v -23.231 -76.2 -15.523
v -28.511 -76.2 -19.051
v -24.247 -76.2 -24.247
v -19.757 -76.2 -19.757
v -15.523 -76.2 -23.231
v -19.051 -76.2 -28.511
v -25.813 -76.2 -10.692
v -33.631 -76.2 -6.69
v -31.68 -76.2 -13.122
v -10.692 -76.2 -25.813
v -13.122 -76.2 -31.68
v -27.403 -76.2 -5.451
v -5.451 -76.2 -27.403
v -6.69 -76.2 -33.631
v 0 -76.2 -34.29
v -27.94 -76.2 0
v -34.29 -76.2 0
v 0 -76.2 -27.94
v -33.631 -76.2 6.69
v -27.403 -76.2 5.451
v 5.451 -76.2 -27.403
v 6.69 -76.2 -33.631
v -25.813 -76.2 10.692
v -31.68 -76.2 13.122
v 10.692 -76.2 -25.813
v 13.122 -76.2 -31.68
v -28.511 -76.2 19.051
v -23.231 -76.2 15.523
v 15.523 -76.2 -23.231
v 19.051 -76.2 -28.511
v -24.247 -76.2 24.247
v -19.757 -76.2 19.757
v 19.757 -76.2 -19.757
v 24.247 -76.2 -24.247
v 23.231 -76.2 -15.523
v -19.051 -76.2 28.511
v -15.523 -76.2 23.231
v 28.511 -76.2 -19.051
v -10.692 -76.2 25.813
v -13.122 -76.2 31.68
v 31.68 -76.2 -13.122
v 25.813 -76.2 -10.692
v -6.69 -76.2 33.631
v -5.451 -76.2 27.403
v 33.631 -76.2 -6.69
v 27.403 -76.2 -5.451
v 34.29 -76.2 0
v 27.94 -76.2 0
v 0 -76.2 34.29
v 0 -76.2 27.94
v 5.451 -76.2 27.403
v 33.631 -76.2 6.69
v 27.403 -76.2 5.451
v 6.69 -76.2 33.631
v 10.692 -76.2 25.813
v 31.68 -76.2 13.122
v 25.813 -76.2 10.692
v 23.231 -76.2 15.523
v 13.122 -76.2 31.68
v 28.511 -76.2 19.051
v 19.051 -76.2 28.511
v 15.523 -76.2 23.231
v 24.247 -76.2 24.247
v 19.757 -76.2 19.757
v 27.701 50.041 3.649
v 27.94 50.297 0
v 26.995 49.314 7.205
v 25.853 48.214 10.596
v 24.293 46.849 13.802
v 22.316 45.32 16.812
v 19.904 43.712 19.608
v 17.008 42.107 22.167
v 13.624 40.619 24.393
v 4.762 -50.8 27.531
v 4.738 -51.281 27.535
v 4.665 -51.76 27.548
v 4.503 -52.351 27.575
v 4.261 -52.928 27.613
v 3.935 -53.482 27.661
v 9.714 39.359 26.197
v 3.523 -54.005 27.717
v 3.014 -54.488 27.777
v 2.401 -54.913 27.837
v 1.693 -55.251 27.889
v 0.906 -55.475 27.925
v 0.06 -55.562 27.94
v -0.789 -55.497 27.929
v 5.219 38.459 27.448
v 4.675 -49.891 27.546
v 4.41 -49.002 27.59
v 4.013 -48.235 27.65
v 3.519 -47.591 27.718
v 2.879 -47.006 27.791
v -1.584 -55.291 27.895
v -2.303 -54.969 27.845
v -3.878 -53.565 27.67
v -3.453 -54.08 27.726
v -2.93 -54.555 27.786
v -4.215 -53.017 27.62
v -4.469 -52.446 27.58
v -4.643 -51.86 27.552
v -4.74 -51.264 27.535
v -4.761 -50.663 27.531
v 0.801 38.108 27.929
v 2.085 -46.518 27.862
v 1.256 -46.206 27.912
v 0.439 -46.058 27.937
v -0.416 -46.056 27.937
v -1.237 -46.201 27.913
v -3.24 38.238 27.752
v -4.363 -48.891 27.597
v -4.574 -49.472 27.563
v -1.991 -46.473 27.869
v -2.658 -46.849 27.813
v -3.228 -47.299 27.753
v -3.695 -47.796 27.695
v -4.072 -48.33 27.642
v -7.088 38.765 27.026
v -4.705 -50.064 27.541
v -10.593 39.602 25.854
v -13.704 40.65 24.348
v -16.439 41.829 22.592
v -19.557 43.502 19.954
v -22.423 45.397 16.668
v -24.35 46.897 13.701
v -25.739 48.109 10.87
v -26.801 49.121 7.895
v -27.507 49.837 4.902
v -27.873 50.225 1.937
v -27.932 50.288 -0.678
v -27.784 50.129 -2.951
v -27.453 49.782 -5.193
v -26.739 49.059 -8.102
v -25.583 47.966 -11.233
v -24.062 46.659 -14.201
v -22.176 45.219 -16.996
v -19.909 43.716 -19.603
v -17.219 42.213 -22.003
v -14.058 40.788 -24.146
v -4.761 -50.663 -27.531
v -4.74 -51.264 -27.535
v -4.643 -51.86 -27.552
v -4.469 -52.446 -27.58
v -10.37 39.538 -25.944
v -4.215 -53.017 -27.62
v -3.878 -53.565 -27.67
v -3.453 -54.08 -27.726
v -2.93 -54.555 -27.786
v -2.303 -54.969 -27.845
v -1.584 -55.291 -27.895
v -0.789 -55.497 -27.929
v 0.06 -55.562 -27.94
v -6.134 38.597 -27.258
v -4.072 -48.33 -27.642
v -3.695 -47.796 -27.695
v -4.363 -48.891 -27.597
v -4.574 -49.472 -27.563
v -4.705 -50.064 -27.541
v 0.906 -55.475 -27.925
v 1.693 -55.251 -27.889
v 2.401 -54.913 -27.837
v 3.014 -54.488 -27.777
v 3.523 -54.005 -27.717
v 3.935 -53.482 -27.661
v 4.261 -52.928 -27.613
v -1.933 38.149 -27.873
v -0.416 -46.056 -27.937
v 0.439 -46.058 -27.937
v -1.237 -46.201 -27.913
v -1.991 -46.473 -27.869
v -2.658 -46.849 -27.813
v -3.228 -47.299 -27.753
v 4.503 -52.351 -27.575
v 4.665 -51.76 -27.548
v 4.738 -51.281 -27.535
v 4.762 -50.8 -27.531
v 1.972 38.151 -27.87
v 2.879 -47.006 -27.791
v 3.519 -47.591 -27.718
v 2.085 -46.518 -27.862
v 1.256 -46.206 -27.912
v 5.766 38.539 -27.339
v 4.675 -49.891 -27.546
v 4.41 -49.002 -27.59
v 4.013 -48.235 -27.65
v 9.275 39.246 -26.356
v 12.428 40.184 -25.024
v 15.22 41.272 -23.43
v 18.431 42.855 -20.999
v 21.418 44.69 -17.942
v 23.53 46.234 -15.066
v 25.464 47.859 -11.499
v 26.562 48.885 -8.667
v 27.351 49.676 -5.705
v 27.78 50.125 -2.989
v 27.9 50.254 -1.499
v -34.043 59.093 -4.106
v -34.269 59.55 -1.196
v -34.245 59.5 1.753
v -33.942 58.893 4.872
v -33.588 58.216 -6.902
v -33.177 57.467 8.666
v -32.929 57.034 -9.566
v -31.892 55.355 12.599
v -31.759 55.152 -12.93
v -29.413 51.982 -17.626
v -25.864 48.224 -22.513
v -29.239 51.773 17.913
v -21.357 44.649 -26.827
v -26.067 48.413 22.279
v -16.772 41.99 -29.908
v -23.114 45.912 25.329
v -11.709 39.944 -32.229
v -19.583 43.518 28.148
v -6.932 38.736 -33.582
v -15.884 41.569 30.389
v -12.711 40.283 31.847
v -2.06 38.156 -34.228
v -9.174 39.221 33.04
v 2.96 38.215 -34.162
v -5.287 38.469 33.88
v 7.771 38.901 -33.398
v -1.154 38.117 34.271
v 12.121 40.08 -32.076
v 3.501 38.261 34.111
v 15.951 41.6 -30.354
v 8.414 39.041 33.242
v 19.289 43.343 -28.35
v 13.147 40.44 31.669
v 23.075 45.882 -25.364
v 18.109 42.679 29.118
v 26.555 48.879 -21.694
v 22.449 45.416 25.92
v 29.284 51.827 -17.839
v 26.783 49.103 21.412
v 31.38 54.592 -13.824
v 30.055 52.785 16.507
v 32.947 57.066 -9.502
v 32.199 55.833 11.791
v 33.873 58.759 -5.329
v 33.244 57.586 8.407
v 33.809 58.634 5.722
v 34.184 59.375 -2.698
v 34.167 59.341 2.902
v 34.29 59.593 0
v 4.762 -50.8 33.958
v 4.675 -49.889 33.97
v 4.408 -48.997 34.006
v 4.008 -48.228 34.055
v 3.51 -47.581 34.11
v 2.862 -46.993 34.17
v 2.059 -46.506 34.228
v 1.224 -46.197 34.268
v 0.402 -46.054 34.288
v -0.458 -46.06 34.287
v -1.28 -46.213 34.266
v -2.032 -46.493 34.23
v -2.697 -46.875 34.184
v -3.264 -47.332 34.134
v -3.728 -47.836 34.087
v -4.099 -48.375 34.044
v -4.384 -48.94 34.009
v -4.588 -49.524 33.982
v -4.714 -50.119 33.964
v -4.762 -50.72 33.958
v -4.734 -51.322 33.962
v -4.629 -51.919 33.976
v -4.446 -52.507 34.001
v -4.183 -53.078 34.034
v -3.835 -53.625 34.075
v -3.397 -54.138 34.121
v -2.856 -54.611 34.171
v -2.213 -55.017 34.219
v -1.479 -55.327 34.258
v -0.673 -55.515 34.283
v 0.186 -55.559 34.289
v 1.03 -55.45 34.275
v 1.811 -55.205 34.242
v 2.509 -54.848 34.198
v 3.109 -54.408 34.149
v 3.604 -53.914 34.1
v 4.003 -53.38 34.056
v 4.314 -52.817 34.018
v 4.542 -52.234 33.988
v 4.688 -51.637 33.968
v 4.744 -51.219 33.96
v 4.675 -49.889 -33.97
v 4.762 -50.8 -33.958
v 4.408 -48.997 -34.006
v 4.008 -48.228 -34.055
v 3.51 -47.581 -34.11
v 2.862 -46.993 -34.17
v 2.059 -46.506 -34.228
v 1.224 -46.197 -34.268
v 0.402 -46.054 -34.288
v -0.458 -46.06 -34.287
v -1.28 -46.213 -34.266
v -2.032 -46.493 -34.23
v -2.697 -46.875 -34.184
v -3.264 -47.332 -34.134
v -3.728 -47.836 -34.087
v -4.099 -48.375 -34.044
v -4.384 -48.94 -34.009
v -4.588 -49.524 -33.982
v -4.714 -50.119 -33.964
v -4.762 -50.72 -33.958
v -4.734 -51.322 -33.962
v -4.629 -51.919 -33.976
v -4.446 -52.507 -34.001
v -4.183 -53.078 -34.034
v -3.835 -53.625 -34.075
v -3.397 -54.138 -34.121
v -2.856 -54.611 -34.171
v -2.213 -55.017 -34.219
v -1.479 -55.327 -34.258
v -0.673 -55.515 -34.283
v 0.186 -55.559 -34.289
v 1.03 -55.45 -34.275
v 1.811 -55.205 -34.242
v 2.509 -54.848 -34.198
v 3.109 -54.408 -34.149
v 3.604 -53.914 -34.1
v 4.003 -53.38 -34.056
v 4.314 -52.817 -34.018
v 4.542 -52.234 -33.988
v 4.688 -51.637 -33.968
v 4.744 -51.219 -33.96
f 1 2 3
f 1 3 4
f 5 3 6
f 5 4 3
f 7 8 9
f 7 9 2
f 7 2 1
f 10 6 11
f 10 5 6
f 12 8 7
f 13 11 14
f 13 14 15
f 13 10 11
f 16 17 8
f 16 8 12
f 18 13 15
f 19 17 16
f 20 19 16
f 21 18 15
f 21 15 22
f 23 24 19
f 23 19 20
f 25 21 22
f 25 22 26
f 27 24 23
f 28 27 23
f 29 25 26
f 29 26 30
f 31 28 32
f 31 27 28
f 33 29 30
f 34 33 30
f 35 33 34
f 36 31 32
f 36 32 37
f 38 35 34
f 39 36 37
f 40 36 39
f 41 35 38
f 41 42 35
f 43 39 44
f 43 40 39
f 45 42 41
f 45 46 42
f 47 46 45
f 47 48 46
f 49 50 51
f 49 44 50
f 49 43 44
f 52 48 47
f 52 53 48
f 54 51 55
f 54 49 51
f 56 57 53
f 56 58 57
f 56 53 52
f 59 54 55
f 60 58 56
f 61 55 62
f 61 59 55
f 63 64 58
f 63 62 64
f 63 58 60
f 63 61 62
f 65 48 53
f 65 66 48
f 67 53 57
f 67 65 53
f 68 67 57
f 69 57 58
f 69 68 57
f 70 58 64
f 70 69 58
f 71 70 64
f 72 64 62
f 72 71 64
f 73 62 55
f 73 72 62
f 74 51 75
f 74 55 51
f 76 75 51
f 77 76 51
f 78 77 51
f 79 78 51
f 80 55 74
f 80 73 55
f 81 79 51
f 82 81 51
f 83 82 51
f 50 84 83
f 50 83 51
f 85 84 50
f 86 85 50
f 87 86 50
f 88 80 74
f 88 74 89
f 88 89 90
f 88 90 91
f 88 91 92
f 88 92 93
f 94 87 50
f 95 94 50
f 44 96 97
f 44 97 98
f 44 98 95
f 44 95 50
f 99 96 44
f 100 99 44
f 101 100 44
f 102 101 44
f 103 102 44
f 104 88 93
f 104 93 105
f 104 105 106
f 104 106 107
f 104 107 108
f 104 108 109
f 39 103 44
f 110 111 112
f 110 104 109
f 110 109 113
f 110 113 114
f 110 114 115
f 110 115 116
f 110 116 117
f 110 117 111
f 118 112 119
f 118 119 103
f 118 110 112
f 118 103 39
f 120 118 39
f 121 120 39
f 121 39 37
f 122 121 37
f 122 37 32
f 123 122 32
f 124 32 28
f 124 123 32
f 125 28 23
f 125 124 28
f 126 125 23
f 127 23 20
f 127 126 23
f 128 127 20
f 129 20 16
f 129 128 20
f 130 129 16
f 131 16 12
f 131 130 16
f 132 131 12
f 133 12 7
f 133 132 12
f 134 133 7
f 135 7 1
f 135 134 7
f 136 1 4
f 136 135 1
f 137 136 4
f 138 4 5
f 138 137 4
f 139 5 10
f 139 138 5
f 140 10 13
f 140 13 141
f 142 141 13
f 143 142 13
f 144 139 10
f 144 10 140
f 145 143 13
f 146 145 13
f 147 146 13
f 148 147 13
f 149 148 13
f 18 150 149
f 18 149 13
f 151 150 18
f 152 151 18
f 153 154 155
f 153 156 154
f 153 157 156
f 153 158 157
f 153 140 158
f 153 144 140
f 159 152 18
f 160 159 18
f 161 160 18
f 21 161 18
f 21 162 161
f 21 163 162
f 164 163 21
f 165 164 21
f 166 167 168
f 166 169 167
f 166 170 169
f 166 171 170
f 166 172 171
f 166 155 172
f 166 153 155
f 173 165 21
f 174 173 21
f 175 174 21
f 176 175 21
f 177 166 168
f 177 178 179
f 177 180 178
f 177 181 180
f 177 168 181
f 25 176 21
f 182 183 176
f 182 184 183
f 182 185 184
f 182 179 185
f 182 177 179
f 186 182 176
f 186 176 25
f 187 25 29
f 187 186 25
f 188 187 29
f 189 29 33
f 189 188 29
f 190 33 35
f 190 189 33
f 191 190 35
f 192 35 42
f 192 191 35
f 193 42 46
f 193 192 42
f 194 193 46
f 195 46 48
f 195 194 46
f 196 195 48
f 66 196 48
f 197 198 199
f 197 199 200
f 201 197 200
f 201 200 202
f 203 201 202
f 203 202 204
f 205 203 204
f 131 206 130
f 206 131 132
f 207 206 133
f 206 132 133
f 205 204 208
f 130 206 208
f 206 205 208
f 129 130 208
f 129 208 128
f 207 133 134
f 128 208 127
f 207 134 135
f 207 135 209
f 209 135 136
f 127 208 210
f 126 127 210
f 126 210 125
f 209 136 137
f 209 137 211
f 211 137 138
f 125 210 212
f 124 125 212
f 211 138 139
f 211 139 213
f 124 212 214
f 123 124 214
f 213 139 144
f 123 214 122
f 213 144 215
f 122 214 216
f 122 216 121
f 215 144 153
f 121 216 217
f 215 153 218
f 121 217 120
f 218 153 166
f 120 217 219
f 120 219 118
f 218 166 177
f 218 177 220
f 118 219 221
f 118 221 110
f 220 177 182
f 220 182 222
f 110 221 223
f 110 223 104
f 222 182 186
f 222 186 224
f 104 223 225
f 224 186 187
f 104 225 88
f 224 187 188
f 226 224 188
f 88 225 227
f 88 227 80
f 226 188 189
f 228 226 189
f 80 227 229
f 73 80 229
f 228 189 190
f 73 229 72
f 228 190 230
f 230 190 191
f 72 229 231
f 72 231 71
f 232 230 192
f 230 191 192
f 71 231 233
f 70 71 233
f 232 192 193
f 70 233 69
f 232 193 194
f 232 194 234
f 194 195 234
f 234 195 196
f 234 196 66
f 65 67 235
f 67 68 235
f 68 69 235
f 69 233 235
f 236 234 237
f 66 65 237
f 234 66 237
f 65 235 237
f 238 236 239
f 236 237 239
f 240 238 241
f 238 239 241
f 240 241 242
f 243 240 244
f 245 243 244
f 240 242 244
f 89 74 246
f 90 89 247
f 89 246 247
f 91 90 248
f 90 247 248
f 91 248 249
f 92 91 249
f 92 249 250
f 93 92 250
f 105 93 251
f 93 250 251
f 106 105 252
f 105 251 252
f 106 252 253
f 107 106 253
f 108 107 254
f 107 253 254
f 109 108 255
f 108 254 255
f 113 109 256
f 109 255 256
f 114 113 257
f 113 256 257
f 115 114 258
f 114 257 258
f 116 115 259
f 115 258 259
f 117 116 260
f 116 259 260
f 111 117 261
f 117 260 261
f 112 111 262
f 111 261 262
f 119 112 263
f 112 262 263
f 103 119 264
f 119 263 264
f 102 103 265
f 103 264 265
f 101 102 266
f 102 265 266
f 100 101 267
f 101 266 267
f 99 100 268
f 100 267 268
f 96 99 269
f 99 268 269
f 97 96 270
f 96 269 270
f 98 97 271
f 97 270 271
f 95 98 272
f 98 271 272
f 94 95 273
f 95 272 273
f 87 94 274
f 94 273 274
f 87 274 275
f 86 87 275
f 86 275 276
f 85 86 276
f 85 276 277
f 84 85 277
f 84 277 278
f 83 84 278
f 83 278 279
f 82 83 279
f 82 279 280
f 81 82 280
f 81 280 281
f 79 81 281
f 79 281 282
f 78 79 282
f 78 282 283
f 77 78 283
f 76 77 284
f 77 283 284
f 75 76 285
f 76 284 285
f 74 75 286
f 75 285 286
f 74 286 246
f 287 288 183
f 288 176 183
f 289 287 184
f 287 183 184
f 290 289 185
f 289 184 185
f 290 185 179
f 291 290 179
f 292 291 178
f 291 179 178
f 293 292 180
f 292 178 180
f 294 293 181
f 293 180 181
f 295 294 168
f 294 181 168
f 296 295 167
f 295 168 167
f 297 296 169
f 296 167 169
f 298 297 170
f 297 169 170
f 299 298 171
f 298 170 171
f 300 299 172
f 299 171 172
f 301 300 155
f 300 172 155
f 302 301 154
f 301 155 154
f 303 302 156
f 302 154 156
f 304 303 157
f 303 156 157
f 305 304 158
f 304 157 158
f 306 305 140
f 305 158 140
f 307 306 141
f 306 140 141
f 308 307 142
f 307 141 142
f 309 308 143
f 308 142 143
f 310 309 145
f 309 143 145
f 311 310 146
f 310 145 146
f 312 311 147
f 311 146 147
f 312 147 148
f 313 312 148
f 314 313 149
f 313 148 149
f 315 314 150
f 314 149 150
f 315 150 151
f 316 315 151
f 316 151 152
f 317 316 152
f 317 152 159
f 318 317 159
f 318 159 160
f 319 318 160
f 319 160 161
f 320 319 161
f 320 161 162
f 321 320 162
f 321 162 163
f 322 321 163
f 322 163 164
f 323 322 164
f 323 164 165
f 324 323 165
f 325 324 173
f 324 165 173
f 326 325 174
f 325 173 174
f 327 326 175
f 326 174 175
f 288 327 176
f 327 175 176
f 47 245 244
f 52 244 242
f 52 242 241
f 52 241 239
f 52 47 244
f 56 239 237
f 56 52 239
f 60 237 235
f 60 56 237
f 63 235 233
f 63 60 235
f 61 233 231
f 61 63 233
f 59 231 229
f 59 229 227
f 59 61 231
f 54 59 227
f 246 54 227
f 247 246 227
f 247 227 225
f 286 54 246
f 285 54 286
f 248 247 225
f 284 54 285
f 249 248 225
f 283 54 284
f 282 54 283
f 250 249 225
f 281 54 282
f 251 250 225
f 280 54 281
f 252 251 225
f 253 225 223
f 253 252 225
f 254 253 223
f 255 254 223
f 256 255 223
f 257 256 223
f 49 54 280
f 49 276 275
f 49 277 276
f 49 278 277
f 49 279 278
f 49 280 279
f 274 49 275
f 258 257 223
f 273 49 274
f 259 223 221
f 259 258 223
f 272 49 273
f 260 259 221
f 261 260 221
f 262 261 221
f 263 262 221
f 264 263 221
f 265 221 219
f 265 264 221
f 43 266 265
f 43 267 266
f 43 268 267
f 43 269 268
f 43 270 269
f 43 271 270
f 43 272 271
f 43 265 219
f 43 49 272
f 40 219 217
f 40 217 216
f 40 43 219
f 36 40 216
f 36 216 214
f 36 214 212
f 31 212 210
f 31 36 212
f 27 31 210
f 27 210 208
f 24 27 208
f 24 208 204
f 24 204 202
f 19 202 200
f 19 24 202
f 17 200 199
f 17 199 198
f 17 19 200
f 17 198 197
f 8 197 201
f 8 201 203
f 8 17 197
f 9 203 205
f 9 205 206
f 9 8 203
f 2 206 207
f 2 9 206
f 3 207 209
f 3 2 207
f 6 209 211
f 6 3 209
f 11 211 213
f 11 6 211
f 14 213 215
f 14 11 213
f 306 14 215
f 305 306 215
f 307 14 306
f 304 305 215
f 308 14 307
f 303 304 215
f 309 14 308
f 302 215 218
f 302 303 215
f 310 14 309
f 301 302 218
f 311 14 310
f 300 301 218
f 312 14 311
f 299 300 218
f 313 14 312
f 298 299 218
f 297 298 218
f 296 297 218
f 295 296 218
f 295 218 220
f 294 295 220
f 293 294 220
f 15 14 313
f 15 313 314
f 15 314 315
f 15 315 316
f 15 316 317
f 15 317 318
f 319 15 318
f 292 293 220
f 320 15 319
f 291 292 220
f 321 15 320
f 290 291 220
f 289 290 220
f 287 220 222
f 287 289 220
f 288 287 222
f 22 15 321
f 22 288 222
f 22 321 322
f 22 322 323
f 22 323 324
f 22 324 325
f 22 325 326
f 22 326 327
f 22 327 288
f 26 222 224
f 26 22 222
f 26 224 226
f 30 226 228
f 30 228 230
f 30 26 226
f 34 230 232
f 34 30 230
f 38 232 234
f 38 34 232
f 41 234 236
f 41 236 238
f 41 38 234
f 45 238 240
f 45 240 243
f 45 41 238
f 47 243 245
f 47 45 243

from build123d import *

# Parameters (mm, degrees)
F0_R     = 34.29
F0_R_2   = 27.94
F1_DEPTH = 76.2
F2_R     = 4.7625
F3_DEPTH = 38.1
F4_R     = 38.1
F5_DEPTH = 38.1


with BuildPart() as f1:
    # F0 (on Front) → F1 (new body, symmetric)
    with BuildSketch(Plane.XZ):
        Circle(F0_R)
        Circle(F0_R_2, mode=Mode.SUBTRACT)
    extrude(amount=F1_DEPTH, both=True)

    # F2 (on Top) → F3 (cut, symmetric)
    with BuildSketch(Plane.XY):
        with Locations((0, -50.8)):
            Circle(F2_R)
    extrude(amount=F3_DEPTH, both=True, mode=Mode.SUBTRACT)

    # F4 (on Top) → F5 (cut, symmetric)
    with BuildSketch(Plane.XY):
        with Locations((0, 76.2)):
            Circle(F4_R)
    extrude(amount=F5_DEPTH, both=True, mode=Mode.SUBTRACT)


solid = f1.part
